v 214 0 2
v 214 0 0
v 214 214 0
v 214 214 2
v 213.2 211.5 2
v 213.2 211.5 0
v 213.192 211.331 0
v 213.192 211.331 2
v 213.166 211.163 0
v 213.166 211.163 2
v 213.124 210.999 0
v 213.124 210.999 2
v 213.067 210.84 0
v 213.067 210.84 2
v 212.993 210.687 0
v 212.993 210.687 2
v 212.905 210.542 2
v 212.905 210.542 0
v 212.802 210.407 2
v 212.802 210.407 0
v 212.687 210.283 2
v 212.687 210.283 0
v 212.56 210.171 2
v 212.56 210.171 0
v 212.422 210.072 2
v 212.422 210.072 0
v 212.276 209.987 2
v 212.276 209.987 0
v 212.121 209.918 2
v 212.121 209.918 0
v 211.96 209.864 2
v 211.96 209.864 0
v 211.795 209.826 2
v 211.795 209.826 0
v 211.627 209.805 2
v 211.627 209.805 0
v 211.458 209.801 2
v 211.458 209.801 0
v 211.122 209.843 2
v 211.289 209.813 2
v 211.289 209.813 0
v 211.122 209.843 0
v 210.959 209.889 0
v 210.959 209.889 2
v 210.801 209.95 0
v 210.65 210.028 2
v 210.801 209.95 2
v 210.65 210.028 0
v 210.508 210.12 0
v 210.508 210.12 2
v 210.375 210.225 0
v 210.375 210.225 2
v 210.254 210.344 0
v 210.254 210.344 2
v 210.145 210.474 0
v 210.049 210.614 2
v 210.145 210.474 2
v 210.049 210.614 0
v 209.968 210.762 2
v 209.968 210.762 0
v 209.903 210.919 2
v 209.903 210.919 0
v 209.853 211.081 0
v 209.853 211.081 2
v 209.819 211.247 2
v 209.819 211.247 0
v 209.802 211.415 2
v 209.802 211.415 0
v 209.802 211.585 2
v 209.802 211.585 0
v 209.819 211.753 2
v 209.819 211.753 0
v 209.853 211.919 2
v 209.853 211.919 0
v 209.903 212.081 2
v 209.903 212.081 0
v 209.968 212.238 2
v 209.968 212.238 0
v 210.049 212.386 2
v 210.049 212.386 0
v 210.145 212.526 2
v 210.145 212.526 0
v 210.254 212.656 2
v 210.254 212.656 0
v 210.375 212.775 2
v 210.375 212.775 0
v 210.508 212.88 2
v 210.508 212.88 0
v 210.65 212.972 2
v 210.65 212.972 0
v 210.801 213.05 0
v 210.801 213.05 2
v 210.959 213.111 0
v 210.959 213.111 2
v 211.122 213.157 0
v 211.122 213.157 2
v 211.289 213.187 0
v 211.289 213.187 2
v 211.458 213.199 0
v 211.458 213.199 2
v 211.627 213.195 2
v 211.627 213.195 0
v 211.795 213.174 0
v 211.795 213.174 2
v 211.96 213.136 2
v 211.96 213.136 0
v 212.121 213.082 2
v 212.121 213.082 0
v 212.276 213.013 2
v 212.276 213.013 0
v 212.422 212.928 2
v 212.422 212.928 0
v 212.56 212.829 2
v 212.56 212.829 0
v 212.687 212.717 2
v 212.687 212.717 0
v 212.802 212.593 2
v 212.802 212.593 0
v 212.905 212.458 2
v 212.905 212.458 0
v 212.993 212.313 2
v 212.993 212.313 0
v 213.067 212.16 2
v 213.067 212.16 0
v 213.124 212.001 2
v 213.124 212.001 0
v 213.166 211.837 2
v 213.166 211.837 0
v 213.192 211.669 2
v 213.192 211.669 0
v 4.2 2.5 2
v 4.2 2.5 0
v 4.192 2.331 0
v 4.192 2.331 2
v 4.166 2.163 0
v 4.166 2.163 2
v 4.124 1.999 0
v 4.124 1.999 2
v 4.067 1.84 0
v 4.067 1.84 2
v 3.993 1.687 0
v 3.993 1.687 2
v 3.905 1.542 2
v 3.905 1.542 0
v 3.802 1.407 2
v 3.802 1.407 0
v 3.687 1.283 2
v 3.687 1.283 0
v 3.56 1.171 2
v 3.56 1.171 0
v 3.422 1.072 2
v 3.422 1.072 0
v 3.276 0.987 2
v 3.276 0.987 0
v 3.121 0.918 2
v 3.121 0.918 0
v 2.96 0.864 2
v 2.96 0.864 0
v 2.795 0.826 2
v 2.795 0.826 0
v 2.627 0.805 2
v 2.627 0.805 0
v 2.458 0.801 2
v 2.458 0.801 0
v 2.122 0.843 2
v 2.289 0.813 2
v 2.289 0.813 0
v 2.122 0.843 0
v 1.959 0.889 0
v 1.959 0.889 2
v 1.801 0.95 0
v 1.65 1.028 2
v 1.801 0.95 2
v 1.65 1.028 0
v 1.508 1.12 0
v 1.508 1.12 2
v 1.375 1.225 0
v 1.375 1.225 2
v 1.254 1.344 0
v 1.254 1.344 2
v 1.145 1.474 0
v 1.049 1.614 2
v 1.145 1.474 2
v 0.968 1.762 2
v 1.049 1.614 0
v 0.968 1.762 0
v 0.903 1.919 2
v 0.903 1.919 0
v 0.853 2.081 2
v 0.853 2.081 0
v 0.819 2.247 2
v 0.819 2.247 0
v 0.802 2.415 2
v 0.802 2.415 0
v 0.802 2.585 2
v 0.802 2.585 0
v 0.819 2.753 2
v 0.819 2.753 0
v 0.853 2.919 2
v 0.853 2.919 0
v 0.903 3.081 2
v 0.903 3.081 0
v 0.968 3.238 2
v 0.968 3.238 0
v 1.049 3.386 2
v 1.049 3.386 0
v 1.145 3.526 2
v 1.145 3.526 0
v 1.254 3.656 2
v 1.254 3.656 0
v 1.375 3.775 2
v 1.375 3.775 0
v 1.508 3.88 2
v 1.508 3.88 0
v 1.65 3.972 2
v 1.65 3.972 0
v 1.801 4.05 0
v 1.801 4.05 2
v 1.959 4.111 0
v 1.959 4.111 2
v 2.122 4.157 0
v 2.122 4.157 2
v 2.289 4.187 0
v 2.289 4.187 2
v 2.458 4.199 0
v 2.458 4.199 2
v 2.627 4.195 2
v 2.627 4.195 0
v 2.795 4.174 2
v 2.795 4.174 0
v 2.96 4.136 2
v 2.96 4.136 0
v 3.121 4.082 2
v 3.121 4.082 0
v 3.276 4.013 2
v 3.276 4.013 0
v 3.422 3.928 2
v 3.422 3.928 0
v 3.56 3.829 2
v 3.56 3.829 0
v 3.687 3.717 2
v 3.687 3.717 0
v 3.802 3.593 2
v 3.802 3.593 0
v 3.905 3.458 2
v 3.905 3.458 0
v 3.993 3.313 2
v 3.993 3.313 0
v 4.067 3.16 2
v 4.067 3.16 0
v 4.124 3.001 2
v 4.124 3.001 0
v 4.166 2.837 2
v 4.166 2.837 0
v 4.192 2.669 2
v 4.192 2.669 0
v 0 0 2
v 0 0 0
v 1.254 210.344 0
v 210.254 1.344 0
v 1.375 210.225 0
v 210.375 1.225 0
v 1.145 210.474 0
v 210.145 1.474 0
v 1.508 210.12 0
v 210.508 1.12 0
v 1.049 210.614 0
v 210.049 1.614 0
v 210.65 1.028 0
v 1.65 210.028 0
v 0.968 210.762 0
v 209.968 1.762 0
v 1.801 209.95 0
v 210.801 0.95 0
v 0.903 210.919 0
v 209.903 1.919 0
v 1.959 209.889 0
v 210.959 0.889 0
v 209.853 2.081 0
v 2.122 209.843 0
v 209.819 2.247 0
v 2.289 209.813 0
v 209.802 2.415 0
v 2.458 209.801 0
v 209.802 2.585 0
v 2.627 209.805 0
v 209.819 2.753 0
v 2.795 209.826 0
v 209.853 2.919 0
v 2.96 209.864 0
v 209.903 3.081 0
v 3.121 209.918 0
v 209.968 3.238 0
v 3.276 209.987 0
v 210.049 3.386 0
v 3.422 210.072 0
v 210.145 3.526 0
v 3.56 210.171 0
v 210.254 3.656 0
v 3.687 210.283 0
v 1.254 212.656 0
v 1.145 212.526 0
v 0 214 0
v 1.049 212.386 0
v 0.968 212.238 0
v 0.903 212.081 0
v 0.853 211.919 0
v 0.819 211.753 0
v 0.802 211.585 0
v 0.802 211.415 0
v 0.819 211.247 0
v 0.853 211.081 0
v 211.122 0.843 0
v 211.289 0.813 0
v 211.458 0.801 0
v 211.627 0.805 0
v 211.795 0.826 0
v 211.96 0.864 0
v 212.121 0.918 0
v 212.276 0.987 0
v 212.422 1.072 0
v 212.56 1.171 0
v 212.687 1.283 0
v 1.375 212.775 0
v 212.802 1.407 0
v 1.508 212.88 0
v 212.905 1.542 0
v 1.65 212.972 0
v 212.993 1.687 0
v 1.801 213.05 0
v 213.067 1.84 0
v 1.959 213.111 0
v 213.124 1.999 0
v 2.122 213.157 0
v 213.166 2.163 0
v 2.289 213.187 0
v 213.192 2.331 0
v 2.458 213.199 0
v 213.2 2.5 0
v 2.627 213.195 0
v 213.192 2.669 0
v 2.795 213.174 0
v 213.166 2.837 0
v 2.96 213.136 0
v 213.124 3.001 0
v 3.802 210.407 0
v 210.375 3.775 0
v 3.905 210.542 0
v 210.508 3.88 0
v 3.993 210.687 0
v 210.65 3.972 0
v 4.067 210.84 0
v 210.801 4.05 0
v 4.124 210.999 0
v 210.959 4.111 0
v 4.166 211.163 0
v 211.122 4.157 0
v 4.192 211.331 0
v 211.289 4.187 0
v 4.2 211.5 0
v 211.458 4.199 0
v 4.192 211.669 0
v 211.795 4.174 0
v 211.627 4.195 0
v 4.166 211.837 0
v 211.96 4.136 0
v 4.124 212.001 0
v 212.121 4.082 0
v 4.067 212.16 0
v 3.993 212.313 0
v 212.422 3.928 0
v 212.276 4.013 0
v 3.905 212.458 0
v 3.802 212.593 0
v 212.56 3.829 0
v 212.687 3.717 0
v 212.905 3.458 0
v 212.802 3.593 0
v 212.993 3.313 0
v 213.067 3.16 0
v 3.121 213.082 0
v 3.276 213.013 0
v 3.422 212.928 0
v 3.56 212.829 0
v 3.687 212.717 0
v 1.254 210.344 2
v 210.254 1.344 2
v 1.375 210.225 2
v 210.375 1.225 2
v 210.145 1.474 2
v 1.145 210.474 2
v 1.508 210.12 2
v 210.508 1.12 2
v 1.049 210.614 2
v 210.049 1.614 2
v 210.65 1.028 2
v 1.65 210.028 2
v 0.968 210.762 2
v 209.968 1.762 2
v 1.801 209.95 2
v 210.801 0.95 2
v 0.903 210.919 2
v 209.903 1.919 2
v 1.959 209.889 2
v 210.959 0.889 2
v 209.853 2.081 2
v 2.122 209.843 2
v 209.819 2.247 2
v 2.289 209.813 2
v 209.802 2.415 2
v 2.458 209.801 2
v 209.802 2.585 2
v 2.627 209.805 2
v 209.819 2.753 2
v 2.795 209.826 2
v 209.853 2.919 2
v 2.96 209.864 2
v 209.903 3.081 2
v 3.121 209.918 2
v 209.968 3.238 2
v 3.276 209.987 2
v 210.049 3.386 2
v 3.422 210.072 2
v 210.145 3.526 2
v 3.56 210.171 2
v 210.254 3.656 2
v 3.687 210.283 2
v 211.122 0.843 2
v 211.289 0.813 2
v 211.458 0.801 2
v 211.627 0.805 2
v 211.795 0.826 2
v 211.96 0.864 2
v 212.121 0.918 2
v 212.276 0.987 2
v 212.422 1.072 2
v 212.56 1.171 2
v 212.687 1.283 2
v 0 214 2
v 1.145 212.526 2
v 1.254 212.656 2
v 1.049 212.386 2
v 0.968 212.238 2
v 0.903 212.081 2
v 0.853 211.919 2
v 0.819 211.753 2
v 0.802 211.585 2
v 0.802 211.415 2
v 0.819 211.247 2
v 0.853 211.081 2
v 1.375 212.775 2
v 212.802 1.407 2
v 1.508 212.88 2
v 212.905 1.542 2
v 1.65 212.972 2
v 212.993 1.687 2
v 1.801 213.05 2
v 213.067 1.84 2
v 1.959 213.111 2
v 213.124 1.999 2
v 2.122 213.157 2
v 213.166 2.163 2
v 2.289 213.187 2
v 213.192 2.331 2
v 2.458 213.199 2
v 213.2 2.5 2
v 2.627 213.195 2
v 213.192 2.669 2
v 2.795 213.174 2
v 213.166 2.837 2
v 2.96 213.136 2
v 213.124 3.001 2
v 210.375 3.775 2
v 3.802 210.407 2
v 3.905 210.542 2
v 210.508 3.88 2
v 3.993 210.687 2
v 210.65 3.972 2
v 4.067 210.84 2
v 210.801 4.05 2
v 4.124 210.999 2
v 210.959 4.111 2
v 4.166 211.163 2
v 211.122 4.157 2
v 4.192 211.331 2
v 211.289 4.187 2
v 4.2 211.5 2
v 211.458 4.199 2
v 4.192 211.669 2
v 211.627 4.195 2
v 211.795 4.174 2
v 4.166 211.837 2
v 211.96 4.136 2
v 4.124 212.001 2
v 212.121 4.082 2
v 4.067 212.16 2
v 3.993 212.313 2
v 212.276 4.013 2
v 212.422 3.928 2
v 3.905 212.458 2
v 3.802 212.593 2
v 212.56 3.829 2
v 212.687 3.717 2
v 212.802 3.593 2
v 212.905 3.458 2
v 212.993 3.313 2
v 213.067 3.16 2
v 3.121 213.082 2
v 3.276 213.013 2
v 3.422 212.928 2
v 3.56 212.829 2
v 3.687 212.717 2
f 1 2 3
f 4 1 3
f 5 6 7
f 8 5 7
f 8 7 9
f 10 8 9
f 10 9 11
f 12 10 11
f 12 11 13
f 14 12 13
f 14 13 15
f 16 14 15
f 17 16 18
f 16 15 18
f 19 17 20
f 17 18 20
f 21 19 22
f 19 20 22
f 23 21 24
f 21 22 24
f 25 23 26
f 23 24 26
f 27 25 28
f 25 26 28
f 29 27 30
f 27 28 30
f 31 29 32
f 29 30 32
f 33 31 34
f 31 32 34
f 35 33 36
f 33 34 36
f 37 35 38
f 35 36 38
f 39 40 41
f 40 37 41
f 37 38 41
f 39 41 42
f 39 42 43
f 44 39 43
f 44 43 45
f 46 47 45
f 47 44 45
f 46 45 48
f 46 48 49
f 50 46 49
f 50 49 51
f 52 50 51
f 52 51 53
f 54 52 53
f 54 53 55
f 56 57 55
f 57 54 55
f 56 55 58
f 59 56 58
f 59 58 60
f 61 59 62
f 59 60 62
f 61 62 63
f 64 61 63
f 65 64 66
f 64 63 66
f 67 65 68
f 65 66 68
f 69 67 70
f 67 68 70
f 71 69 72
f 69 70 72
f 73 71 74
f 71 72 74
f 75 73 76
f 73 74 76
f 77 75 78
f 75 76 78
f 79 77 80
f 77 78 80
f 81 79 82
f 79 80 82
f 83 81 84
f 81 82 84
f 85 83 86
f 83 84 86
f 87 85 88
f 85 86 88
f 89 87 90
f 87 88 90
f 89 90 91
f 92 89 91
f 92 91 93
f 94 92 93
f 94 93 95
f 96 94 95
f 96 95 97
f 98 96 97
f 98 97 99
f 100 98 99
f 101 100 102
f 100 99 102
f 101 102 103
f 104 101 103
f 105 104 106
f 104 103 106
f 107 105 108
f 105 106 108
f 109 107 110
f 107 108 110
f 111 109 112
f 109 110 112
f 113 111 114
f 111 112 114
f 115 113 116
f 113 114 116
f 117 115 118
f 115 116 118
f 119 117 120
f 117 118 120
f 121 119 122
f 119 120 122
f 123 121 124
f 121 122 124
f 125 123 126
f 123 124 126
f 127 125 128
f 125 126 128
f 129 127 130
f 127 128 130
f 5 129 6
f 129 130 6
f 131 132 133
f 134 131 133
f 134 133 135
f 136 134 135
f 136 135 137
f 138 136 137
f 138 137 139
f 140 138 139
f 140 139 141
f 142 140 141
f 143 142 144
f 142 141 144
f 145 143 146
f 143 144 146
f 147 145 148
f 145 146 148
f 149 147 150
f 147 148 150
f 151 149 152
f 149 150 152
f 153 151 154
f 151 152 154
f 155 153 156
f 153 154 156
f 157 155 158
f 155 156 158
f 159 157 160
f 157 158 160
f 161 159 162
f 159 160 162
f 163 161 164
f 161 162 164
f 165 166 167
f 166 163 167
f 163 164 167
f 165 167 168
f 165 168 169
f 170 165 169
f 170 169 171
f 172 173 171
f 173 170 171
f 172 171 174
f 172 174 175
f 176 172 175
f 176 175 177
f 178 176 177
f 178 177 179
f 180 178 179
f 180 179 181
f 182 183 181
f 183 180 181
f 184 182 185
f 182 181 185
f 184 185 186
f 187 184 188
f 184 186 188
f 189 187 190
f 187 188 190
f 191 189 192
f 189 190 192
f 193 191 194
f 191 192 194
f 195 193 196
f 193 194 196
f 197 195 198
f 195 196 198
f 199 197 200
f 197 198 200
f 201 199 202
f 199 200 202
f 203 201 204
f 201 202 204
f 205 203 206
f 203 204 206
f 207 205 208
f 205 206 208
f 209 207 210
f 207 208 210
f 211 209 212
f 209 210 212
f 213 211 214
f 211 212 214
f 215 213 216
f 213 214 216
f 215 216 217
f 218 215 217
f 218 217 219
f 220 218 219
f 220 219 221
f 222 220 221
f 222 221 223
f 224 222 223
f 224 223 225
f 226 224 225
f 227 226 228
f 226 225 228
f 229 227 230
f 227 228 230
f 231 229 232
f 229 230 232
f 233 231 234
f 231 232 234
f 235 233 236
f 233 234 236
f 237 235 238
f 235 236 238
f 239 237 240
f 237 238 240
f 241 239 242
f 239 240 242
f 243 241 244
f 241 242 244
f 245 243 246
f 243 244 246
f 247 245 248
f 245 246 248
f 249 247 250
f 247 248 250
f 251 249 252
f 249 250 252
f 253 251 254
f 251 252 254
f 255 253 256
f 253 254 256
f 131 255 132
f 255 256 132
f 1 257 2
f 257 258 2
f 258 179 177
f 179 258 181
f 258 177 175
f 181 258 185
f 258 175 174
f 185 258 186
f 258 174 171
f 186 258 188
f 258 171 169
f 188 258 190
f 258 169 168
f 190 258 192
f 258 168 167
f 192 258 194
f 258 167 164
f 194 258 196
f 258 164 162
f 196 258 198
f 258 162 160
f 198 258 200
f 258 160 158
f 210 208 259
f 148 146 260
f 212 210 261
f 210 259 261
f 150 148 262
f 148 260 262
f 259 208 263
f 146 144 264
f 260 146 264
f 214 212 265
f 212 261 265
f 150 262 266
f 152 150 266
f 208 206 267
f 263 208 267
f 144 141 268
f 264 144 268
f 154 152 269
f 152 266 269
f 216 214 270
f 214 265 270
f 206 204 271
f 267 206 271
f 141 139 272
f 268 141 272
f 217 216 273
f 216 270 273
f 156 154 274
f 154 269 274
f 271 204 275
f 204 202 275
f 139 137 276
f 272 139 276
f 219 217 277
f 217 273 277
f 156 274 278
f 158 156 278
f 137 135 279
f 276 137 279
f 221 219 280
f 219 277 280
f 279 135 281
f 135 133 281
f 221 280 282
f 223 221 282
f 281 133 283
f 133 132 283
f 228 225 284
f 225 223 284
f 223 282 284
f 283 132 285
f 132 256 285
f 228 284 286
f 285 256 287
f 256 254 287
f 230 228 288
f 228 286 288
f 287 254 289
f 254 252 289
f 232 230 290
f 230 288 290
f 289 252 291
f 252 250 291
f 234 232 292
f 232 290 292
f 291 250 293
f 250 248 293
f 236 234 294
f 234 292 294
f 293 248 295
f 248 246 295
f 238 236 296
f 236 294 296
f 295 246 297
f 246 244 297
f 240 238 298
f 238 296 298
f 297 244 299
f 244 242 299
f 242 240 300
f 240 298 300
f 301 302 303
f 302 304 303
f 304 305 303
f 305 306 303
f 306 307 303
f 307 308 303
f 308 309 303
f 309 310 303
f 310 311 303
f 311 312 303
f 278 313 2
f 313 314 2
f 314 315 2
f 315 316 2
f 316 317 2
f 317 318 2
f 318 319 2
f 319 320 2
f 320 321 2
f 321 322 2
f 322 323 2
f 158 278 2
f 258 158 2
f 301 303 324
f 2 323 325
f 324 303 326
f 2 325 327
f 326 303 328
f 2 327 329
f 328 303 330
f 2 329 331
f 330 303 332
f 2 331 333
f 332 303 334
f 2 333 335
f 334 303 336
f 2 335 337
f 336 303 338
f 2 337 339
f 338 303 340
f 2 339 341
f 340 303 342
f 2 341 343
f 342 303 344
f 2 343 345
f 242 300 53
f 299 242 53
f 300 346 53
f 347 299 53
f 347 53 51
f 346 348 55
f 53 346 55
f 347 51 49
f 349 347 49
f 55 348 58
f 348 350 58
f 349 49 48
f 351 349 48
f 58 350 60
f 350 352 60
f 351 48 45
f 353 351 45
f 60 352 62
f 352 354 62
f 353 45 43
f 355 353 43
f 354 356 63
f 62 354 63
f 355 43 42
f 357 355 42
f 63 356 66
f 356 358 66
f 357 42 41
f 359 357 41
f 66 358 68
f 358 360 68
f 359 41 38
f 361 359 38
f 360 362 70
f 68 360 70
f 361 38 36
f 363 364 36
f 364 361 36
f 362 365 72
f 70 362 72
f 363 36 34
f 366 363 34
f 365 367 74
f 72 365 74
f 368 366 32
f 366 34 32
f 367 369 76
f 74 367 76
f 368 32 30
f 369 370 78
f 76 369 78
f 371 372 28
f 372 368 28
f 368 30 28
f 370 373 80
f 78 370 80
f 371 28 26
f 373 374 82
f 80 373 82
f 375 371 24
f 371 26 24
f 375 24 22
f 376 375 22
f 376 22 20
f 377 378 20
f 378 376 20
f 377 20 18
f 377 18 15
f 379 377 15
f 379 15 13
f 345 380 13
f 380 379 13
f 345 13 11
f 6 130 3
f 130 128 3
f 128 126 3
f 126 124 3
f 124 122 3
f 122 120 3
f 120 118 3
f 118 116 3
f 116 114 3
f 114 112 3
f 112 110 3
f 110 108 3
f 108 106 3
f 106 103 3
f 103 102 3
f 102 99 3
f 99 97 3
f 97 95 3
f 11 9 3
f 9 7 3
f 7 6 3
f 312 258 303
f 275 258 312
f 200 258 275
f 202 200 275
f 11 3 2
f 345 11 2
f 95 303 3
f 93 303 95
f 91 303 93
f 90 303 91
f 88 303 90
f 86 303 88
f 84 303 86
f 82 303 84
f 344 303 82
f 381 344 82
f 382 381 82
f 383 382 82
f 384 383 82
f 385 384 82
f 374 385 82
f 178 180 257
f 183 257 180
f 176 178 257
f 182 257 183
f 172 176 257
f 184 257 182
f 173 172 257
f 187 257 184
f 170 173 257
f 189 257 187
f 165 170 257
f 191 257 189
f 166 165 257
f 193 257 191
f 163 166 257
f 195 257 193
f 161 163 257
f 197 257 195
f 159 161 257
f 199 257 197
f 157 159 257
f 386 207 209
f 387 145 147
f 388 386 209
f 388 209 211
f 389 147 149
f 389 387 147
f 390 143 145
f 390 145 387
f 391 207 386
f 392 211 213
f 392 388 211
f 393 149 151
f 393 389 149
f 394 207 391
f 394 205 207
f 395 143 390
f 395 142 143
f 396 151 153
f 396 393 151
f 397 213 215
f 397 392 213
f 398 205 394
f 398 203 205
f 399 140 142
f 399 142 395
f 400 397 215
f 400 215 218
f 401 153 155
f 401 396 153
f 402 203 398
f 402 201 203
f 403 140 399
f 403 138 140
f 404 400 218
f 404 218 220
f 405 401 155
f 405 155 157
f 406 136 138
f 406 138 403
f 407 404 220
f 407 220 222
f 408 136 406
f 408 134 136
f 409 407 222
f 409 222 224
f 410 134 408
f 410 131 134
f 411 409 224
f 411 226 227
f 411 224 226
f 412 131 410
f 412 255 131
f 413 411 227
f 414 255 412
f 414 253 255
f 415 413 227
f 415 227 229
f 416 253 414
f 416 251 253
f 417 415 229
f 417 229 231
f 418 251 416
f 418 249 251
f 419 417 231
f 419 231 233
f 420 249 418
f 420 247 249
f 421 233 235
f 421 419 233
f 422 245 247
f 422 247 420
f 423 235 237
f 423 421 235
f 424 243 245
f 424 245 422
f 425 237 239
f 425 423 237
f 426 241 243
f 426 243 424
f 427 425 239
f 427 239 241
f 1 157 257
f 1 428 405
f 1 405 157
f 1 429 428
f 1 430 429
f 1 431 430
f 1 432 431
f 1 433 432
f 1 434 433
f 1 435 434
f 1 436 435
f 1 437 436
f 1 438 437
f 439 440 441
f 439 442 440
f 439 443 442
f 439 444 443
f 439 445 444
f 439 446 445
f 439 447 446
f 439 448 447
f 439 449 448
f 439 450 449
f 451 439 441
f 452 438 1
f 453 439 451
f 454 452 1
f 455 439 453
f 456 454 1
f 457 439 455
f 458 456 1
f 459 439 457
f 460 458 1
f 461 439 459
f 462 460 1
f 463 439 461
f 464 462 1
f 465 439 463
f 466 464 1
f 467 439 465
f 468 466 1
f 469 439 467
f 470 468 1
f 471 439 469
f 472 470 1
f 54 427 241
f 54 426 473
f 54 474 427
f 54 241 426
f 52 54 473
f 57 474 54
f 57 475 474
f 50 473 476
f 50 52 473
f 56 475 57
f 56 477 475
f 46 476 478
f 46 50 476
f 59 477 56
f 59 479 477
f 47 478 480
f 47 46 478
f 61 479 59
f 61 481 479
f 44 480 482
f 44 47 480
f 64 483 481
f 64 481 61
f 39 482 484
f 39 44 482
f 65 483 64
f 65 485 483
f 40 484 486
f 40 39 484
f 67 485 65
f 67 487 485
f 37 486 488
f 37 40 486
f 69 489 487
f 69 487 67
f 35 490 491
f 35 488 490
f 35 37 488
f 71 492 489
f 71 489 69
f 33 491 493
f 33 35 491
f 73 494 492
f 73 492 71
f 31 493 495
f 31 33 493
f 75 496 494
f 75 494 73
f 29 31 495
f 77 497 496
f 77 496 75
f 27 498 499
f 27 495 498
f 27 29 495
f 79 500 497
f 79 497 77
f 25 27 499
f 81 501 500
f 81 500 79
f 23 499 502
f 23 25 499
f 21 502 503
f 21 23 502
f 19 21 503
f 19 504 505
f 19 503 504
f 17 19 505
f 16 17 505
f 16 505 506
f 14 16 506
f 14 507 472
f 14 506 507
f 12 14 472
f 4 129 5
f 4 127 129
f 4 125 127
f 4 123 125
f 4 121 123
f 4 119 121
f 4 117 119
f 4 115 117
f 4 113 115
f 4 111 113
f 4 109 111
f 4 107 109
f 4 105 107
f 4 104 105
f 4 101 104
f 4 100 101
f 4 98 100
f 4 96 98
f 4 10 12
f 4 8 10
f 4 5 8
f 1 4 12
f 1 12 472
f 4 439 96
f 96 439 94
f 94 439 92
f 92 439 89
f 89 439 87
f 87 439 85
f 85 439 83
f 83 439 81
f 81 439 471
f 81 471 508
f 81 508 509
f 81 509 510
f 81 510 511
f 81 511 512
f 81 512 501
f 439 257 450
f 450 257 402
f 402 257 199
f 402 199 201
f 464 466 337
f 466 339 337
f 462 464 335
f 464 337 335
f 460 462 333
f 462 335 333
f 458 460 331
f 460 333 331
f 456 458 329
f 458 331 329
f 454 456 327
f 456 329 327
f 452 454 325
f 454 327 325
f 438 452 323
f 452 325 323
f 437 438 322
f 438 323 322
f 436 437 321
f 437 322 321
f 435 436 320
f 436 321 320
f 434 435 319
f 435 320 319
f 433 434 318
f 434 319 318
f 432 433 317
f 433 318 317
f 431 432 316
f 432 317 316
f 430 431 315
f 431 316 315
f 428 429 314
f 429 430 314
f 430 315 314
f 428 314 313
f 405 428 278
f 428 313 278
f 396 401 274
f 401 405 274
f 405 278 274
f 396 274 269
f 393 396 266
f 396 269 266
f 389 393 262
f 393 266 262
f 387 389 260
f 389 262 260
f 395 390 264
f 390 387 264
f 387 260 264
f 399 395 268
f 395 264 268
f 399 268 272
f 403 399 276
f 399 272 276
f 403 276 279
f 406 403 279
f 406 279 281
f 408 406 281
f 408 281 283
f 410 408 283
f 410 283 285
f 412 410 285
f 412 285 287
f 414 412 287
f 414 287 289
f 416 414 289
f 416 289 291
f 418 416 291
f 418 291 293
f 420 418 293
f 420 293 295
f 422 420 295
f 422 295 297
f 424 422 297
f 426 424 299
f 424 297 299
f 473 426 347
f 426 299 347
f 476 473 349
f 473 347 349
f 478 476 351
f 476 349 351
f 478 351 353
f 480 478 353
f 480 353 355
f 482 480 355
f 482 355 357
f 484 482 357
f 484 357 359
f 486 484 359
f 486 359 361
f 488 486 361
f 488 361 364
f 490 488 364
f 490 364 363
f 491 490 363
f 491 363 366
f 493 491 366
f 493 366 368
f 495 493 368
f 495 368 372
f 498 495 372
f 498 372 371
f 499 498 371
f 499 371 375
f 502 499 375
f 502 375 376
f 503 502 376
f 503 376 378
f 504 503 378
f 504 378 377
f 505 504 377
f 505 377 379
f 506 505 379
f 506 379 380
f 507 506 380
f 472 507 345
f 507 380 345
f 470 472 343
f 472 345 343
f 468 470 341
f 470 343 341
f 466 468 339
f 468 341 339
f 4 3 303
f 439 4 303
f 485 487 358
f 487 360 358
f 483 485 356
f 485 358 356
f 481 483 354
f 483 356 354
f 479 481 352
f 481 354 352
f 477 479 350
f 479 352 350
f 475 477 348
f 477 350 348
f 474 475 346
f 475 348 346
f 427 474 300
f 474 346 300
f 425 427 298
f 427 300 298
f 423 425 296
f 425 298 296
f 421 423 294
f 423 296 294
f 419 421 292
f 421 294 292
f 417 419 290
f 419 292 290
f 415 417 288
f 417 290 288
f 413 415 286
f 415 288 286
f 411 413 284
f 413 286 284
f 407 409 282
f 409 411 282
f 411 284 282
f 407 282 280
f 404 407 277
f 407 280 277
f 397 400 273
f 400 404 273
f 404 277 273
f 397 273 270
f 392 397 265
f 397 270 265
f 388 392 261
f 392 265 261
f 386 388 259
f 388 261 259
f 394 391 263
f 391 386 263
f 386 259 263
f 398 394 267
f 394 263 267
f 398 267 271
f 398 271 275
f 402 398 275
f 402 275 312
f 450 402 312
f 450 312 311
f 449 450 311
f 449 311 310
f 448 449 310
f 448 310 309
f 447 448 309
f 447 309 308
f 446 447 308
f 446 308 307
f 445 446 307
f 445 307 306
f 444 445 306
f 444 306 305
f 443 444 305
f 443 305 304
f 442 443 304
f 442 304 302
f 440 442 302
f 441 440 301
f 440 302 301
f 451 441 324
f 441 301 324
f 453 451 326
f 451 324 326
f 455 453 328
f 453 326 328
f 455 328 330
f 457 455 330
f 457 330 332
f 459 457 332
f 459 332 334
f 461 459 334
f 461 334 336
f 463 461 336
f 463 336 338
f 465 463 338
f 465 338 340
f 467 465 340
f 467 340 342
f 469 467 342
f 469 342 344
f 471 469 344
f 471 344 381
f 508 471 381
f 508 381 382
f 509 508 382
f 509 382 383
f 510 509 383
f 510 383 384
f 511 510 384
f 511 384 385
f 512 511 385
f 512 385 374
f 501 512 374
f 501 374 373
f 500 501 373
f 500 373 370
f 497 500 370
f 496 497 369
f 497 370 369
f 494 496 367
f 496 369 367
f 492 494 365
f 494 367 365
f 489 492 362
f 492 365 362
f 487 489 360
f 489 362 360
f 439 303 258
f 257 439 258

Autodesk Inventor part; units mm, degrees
ref_plane "YZ Plane" through (0, 0, 0) normal (1, 0, 0) x (0, 1, 0)
ref_plane "XZ Plane" through (0, 0, 0) normal (0, 1, 0) x (-1, 0, 0)
ref_plane "XY Plane" through (0, 0, 0) normal (0, 0, 1) x (1, 0, 0)
sketch "Sketch1" plane through (0, 0, 0) normal (0, 0, 1) x (1, 0, 0)
  line L0 (0, 0) -> (214, 0)
  line L1 (214, 0) -> (214, 214)
  line L2 (214, 214) -> (0, 214)
  line L3 (0, 214) -> (0, 0)
  line L4 (2.5, 211.5) -> (211.5, 211.5) construction
  line L5 (211.5, 211.5) -> (211.5, 2.5) construction
  line L6 (211.5, 2.5) -> (2.5, 2.5) construction
  line L7 (2.5, 2.5) -> (2.5, 211.5) construction
  circle A0 centre (2.5, 211.5) radius 1.7
  circle A1 centre (211.5, 211.5) radius 1.7
  circle A2 centre (211.5, 2.5) radius 1.7
  circle A3 centre (2.5, 2.5) radius 1.7
  point P0 (2.5, 107)
  point P1 (0, 107)
  point P2 (107, 211.5)
  point P3 (107, 214)
  dimension "d0" = 214
  dimension "d1" = 214
  dimension "d2" = 3.4
  dimension "d3" = 3.4
  dimension "d4" = 3.4
  dimension "d5" = 3.4
  dimension "d6" = 209
  dimension "d7" = 209
extrude "Extrusion1" add sketch "Sketch1" along normal blind 2
properties part number "pcb_heatbed"
